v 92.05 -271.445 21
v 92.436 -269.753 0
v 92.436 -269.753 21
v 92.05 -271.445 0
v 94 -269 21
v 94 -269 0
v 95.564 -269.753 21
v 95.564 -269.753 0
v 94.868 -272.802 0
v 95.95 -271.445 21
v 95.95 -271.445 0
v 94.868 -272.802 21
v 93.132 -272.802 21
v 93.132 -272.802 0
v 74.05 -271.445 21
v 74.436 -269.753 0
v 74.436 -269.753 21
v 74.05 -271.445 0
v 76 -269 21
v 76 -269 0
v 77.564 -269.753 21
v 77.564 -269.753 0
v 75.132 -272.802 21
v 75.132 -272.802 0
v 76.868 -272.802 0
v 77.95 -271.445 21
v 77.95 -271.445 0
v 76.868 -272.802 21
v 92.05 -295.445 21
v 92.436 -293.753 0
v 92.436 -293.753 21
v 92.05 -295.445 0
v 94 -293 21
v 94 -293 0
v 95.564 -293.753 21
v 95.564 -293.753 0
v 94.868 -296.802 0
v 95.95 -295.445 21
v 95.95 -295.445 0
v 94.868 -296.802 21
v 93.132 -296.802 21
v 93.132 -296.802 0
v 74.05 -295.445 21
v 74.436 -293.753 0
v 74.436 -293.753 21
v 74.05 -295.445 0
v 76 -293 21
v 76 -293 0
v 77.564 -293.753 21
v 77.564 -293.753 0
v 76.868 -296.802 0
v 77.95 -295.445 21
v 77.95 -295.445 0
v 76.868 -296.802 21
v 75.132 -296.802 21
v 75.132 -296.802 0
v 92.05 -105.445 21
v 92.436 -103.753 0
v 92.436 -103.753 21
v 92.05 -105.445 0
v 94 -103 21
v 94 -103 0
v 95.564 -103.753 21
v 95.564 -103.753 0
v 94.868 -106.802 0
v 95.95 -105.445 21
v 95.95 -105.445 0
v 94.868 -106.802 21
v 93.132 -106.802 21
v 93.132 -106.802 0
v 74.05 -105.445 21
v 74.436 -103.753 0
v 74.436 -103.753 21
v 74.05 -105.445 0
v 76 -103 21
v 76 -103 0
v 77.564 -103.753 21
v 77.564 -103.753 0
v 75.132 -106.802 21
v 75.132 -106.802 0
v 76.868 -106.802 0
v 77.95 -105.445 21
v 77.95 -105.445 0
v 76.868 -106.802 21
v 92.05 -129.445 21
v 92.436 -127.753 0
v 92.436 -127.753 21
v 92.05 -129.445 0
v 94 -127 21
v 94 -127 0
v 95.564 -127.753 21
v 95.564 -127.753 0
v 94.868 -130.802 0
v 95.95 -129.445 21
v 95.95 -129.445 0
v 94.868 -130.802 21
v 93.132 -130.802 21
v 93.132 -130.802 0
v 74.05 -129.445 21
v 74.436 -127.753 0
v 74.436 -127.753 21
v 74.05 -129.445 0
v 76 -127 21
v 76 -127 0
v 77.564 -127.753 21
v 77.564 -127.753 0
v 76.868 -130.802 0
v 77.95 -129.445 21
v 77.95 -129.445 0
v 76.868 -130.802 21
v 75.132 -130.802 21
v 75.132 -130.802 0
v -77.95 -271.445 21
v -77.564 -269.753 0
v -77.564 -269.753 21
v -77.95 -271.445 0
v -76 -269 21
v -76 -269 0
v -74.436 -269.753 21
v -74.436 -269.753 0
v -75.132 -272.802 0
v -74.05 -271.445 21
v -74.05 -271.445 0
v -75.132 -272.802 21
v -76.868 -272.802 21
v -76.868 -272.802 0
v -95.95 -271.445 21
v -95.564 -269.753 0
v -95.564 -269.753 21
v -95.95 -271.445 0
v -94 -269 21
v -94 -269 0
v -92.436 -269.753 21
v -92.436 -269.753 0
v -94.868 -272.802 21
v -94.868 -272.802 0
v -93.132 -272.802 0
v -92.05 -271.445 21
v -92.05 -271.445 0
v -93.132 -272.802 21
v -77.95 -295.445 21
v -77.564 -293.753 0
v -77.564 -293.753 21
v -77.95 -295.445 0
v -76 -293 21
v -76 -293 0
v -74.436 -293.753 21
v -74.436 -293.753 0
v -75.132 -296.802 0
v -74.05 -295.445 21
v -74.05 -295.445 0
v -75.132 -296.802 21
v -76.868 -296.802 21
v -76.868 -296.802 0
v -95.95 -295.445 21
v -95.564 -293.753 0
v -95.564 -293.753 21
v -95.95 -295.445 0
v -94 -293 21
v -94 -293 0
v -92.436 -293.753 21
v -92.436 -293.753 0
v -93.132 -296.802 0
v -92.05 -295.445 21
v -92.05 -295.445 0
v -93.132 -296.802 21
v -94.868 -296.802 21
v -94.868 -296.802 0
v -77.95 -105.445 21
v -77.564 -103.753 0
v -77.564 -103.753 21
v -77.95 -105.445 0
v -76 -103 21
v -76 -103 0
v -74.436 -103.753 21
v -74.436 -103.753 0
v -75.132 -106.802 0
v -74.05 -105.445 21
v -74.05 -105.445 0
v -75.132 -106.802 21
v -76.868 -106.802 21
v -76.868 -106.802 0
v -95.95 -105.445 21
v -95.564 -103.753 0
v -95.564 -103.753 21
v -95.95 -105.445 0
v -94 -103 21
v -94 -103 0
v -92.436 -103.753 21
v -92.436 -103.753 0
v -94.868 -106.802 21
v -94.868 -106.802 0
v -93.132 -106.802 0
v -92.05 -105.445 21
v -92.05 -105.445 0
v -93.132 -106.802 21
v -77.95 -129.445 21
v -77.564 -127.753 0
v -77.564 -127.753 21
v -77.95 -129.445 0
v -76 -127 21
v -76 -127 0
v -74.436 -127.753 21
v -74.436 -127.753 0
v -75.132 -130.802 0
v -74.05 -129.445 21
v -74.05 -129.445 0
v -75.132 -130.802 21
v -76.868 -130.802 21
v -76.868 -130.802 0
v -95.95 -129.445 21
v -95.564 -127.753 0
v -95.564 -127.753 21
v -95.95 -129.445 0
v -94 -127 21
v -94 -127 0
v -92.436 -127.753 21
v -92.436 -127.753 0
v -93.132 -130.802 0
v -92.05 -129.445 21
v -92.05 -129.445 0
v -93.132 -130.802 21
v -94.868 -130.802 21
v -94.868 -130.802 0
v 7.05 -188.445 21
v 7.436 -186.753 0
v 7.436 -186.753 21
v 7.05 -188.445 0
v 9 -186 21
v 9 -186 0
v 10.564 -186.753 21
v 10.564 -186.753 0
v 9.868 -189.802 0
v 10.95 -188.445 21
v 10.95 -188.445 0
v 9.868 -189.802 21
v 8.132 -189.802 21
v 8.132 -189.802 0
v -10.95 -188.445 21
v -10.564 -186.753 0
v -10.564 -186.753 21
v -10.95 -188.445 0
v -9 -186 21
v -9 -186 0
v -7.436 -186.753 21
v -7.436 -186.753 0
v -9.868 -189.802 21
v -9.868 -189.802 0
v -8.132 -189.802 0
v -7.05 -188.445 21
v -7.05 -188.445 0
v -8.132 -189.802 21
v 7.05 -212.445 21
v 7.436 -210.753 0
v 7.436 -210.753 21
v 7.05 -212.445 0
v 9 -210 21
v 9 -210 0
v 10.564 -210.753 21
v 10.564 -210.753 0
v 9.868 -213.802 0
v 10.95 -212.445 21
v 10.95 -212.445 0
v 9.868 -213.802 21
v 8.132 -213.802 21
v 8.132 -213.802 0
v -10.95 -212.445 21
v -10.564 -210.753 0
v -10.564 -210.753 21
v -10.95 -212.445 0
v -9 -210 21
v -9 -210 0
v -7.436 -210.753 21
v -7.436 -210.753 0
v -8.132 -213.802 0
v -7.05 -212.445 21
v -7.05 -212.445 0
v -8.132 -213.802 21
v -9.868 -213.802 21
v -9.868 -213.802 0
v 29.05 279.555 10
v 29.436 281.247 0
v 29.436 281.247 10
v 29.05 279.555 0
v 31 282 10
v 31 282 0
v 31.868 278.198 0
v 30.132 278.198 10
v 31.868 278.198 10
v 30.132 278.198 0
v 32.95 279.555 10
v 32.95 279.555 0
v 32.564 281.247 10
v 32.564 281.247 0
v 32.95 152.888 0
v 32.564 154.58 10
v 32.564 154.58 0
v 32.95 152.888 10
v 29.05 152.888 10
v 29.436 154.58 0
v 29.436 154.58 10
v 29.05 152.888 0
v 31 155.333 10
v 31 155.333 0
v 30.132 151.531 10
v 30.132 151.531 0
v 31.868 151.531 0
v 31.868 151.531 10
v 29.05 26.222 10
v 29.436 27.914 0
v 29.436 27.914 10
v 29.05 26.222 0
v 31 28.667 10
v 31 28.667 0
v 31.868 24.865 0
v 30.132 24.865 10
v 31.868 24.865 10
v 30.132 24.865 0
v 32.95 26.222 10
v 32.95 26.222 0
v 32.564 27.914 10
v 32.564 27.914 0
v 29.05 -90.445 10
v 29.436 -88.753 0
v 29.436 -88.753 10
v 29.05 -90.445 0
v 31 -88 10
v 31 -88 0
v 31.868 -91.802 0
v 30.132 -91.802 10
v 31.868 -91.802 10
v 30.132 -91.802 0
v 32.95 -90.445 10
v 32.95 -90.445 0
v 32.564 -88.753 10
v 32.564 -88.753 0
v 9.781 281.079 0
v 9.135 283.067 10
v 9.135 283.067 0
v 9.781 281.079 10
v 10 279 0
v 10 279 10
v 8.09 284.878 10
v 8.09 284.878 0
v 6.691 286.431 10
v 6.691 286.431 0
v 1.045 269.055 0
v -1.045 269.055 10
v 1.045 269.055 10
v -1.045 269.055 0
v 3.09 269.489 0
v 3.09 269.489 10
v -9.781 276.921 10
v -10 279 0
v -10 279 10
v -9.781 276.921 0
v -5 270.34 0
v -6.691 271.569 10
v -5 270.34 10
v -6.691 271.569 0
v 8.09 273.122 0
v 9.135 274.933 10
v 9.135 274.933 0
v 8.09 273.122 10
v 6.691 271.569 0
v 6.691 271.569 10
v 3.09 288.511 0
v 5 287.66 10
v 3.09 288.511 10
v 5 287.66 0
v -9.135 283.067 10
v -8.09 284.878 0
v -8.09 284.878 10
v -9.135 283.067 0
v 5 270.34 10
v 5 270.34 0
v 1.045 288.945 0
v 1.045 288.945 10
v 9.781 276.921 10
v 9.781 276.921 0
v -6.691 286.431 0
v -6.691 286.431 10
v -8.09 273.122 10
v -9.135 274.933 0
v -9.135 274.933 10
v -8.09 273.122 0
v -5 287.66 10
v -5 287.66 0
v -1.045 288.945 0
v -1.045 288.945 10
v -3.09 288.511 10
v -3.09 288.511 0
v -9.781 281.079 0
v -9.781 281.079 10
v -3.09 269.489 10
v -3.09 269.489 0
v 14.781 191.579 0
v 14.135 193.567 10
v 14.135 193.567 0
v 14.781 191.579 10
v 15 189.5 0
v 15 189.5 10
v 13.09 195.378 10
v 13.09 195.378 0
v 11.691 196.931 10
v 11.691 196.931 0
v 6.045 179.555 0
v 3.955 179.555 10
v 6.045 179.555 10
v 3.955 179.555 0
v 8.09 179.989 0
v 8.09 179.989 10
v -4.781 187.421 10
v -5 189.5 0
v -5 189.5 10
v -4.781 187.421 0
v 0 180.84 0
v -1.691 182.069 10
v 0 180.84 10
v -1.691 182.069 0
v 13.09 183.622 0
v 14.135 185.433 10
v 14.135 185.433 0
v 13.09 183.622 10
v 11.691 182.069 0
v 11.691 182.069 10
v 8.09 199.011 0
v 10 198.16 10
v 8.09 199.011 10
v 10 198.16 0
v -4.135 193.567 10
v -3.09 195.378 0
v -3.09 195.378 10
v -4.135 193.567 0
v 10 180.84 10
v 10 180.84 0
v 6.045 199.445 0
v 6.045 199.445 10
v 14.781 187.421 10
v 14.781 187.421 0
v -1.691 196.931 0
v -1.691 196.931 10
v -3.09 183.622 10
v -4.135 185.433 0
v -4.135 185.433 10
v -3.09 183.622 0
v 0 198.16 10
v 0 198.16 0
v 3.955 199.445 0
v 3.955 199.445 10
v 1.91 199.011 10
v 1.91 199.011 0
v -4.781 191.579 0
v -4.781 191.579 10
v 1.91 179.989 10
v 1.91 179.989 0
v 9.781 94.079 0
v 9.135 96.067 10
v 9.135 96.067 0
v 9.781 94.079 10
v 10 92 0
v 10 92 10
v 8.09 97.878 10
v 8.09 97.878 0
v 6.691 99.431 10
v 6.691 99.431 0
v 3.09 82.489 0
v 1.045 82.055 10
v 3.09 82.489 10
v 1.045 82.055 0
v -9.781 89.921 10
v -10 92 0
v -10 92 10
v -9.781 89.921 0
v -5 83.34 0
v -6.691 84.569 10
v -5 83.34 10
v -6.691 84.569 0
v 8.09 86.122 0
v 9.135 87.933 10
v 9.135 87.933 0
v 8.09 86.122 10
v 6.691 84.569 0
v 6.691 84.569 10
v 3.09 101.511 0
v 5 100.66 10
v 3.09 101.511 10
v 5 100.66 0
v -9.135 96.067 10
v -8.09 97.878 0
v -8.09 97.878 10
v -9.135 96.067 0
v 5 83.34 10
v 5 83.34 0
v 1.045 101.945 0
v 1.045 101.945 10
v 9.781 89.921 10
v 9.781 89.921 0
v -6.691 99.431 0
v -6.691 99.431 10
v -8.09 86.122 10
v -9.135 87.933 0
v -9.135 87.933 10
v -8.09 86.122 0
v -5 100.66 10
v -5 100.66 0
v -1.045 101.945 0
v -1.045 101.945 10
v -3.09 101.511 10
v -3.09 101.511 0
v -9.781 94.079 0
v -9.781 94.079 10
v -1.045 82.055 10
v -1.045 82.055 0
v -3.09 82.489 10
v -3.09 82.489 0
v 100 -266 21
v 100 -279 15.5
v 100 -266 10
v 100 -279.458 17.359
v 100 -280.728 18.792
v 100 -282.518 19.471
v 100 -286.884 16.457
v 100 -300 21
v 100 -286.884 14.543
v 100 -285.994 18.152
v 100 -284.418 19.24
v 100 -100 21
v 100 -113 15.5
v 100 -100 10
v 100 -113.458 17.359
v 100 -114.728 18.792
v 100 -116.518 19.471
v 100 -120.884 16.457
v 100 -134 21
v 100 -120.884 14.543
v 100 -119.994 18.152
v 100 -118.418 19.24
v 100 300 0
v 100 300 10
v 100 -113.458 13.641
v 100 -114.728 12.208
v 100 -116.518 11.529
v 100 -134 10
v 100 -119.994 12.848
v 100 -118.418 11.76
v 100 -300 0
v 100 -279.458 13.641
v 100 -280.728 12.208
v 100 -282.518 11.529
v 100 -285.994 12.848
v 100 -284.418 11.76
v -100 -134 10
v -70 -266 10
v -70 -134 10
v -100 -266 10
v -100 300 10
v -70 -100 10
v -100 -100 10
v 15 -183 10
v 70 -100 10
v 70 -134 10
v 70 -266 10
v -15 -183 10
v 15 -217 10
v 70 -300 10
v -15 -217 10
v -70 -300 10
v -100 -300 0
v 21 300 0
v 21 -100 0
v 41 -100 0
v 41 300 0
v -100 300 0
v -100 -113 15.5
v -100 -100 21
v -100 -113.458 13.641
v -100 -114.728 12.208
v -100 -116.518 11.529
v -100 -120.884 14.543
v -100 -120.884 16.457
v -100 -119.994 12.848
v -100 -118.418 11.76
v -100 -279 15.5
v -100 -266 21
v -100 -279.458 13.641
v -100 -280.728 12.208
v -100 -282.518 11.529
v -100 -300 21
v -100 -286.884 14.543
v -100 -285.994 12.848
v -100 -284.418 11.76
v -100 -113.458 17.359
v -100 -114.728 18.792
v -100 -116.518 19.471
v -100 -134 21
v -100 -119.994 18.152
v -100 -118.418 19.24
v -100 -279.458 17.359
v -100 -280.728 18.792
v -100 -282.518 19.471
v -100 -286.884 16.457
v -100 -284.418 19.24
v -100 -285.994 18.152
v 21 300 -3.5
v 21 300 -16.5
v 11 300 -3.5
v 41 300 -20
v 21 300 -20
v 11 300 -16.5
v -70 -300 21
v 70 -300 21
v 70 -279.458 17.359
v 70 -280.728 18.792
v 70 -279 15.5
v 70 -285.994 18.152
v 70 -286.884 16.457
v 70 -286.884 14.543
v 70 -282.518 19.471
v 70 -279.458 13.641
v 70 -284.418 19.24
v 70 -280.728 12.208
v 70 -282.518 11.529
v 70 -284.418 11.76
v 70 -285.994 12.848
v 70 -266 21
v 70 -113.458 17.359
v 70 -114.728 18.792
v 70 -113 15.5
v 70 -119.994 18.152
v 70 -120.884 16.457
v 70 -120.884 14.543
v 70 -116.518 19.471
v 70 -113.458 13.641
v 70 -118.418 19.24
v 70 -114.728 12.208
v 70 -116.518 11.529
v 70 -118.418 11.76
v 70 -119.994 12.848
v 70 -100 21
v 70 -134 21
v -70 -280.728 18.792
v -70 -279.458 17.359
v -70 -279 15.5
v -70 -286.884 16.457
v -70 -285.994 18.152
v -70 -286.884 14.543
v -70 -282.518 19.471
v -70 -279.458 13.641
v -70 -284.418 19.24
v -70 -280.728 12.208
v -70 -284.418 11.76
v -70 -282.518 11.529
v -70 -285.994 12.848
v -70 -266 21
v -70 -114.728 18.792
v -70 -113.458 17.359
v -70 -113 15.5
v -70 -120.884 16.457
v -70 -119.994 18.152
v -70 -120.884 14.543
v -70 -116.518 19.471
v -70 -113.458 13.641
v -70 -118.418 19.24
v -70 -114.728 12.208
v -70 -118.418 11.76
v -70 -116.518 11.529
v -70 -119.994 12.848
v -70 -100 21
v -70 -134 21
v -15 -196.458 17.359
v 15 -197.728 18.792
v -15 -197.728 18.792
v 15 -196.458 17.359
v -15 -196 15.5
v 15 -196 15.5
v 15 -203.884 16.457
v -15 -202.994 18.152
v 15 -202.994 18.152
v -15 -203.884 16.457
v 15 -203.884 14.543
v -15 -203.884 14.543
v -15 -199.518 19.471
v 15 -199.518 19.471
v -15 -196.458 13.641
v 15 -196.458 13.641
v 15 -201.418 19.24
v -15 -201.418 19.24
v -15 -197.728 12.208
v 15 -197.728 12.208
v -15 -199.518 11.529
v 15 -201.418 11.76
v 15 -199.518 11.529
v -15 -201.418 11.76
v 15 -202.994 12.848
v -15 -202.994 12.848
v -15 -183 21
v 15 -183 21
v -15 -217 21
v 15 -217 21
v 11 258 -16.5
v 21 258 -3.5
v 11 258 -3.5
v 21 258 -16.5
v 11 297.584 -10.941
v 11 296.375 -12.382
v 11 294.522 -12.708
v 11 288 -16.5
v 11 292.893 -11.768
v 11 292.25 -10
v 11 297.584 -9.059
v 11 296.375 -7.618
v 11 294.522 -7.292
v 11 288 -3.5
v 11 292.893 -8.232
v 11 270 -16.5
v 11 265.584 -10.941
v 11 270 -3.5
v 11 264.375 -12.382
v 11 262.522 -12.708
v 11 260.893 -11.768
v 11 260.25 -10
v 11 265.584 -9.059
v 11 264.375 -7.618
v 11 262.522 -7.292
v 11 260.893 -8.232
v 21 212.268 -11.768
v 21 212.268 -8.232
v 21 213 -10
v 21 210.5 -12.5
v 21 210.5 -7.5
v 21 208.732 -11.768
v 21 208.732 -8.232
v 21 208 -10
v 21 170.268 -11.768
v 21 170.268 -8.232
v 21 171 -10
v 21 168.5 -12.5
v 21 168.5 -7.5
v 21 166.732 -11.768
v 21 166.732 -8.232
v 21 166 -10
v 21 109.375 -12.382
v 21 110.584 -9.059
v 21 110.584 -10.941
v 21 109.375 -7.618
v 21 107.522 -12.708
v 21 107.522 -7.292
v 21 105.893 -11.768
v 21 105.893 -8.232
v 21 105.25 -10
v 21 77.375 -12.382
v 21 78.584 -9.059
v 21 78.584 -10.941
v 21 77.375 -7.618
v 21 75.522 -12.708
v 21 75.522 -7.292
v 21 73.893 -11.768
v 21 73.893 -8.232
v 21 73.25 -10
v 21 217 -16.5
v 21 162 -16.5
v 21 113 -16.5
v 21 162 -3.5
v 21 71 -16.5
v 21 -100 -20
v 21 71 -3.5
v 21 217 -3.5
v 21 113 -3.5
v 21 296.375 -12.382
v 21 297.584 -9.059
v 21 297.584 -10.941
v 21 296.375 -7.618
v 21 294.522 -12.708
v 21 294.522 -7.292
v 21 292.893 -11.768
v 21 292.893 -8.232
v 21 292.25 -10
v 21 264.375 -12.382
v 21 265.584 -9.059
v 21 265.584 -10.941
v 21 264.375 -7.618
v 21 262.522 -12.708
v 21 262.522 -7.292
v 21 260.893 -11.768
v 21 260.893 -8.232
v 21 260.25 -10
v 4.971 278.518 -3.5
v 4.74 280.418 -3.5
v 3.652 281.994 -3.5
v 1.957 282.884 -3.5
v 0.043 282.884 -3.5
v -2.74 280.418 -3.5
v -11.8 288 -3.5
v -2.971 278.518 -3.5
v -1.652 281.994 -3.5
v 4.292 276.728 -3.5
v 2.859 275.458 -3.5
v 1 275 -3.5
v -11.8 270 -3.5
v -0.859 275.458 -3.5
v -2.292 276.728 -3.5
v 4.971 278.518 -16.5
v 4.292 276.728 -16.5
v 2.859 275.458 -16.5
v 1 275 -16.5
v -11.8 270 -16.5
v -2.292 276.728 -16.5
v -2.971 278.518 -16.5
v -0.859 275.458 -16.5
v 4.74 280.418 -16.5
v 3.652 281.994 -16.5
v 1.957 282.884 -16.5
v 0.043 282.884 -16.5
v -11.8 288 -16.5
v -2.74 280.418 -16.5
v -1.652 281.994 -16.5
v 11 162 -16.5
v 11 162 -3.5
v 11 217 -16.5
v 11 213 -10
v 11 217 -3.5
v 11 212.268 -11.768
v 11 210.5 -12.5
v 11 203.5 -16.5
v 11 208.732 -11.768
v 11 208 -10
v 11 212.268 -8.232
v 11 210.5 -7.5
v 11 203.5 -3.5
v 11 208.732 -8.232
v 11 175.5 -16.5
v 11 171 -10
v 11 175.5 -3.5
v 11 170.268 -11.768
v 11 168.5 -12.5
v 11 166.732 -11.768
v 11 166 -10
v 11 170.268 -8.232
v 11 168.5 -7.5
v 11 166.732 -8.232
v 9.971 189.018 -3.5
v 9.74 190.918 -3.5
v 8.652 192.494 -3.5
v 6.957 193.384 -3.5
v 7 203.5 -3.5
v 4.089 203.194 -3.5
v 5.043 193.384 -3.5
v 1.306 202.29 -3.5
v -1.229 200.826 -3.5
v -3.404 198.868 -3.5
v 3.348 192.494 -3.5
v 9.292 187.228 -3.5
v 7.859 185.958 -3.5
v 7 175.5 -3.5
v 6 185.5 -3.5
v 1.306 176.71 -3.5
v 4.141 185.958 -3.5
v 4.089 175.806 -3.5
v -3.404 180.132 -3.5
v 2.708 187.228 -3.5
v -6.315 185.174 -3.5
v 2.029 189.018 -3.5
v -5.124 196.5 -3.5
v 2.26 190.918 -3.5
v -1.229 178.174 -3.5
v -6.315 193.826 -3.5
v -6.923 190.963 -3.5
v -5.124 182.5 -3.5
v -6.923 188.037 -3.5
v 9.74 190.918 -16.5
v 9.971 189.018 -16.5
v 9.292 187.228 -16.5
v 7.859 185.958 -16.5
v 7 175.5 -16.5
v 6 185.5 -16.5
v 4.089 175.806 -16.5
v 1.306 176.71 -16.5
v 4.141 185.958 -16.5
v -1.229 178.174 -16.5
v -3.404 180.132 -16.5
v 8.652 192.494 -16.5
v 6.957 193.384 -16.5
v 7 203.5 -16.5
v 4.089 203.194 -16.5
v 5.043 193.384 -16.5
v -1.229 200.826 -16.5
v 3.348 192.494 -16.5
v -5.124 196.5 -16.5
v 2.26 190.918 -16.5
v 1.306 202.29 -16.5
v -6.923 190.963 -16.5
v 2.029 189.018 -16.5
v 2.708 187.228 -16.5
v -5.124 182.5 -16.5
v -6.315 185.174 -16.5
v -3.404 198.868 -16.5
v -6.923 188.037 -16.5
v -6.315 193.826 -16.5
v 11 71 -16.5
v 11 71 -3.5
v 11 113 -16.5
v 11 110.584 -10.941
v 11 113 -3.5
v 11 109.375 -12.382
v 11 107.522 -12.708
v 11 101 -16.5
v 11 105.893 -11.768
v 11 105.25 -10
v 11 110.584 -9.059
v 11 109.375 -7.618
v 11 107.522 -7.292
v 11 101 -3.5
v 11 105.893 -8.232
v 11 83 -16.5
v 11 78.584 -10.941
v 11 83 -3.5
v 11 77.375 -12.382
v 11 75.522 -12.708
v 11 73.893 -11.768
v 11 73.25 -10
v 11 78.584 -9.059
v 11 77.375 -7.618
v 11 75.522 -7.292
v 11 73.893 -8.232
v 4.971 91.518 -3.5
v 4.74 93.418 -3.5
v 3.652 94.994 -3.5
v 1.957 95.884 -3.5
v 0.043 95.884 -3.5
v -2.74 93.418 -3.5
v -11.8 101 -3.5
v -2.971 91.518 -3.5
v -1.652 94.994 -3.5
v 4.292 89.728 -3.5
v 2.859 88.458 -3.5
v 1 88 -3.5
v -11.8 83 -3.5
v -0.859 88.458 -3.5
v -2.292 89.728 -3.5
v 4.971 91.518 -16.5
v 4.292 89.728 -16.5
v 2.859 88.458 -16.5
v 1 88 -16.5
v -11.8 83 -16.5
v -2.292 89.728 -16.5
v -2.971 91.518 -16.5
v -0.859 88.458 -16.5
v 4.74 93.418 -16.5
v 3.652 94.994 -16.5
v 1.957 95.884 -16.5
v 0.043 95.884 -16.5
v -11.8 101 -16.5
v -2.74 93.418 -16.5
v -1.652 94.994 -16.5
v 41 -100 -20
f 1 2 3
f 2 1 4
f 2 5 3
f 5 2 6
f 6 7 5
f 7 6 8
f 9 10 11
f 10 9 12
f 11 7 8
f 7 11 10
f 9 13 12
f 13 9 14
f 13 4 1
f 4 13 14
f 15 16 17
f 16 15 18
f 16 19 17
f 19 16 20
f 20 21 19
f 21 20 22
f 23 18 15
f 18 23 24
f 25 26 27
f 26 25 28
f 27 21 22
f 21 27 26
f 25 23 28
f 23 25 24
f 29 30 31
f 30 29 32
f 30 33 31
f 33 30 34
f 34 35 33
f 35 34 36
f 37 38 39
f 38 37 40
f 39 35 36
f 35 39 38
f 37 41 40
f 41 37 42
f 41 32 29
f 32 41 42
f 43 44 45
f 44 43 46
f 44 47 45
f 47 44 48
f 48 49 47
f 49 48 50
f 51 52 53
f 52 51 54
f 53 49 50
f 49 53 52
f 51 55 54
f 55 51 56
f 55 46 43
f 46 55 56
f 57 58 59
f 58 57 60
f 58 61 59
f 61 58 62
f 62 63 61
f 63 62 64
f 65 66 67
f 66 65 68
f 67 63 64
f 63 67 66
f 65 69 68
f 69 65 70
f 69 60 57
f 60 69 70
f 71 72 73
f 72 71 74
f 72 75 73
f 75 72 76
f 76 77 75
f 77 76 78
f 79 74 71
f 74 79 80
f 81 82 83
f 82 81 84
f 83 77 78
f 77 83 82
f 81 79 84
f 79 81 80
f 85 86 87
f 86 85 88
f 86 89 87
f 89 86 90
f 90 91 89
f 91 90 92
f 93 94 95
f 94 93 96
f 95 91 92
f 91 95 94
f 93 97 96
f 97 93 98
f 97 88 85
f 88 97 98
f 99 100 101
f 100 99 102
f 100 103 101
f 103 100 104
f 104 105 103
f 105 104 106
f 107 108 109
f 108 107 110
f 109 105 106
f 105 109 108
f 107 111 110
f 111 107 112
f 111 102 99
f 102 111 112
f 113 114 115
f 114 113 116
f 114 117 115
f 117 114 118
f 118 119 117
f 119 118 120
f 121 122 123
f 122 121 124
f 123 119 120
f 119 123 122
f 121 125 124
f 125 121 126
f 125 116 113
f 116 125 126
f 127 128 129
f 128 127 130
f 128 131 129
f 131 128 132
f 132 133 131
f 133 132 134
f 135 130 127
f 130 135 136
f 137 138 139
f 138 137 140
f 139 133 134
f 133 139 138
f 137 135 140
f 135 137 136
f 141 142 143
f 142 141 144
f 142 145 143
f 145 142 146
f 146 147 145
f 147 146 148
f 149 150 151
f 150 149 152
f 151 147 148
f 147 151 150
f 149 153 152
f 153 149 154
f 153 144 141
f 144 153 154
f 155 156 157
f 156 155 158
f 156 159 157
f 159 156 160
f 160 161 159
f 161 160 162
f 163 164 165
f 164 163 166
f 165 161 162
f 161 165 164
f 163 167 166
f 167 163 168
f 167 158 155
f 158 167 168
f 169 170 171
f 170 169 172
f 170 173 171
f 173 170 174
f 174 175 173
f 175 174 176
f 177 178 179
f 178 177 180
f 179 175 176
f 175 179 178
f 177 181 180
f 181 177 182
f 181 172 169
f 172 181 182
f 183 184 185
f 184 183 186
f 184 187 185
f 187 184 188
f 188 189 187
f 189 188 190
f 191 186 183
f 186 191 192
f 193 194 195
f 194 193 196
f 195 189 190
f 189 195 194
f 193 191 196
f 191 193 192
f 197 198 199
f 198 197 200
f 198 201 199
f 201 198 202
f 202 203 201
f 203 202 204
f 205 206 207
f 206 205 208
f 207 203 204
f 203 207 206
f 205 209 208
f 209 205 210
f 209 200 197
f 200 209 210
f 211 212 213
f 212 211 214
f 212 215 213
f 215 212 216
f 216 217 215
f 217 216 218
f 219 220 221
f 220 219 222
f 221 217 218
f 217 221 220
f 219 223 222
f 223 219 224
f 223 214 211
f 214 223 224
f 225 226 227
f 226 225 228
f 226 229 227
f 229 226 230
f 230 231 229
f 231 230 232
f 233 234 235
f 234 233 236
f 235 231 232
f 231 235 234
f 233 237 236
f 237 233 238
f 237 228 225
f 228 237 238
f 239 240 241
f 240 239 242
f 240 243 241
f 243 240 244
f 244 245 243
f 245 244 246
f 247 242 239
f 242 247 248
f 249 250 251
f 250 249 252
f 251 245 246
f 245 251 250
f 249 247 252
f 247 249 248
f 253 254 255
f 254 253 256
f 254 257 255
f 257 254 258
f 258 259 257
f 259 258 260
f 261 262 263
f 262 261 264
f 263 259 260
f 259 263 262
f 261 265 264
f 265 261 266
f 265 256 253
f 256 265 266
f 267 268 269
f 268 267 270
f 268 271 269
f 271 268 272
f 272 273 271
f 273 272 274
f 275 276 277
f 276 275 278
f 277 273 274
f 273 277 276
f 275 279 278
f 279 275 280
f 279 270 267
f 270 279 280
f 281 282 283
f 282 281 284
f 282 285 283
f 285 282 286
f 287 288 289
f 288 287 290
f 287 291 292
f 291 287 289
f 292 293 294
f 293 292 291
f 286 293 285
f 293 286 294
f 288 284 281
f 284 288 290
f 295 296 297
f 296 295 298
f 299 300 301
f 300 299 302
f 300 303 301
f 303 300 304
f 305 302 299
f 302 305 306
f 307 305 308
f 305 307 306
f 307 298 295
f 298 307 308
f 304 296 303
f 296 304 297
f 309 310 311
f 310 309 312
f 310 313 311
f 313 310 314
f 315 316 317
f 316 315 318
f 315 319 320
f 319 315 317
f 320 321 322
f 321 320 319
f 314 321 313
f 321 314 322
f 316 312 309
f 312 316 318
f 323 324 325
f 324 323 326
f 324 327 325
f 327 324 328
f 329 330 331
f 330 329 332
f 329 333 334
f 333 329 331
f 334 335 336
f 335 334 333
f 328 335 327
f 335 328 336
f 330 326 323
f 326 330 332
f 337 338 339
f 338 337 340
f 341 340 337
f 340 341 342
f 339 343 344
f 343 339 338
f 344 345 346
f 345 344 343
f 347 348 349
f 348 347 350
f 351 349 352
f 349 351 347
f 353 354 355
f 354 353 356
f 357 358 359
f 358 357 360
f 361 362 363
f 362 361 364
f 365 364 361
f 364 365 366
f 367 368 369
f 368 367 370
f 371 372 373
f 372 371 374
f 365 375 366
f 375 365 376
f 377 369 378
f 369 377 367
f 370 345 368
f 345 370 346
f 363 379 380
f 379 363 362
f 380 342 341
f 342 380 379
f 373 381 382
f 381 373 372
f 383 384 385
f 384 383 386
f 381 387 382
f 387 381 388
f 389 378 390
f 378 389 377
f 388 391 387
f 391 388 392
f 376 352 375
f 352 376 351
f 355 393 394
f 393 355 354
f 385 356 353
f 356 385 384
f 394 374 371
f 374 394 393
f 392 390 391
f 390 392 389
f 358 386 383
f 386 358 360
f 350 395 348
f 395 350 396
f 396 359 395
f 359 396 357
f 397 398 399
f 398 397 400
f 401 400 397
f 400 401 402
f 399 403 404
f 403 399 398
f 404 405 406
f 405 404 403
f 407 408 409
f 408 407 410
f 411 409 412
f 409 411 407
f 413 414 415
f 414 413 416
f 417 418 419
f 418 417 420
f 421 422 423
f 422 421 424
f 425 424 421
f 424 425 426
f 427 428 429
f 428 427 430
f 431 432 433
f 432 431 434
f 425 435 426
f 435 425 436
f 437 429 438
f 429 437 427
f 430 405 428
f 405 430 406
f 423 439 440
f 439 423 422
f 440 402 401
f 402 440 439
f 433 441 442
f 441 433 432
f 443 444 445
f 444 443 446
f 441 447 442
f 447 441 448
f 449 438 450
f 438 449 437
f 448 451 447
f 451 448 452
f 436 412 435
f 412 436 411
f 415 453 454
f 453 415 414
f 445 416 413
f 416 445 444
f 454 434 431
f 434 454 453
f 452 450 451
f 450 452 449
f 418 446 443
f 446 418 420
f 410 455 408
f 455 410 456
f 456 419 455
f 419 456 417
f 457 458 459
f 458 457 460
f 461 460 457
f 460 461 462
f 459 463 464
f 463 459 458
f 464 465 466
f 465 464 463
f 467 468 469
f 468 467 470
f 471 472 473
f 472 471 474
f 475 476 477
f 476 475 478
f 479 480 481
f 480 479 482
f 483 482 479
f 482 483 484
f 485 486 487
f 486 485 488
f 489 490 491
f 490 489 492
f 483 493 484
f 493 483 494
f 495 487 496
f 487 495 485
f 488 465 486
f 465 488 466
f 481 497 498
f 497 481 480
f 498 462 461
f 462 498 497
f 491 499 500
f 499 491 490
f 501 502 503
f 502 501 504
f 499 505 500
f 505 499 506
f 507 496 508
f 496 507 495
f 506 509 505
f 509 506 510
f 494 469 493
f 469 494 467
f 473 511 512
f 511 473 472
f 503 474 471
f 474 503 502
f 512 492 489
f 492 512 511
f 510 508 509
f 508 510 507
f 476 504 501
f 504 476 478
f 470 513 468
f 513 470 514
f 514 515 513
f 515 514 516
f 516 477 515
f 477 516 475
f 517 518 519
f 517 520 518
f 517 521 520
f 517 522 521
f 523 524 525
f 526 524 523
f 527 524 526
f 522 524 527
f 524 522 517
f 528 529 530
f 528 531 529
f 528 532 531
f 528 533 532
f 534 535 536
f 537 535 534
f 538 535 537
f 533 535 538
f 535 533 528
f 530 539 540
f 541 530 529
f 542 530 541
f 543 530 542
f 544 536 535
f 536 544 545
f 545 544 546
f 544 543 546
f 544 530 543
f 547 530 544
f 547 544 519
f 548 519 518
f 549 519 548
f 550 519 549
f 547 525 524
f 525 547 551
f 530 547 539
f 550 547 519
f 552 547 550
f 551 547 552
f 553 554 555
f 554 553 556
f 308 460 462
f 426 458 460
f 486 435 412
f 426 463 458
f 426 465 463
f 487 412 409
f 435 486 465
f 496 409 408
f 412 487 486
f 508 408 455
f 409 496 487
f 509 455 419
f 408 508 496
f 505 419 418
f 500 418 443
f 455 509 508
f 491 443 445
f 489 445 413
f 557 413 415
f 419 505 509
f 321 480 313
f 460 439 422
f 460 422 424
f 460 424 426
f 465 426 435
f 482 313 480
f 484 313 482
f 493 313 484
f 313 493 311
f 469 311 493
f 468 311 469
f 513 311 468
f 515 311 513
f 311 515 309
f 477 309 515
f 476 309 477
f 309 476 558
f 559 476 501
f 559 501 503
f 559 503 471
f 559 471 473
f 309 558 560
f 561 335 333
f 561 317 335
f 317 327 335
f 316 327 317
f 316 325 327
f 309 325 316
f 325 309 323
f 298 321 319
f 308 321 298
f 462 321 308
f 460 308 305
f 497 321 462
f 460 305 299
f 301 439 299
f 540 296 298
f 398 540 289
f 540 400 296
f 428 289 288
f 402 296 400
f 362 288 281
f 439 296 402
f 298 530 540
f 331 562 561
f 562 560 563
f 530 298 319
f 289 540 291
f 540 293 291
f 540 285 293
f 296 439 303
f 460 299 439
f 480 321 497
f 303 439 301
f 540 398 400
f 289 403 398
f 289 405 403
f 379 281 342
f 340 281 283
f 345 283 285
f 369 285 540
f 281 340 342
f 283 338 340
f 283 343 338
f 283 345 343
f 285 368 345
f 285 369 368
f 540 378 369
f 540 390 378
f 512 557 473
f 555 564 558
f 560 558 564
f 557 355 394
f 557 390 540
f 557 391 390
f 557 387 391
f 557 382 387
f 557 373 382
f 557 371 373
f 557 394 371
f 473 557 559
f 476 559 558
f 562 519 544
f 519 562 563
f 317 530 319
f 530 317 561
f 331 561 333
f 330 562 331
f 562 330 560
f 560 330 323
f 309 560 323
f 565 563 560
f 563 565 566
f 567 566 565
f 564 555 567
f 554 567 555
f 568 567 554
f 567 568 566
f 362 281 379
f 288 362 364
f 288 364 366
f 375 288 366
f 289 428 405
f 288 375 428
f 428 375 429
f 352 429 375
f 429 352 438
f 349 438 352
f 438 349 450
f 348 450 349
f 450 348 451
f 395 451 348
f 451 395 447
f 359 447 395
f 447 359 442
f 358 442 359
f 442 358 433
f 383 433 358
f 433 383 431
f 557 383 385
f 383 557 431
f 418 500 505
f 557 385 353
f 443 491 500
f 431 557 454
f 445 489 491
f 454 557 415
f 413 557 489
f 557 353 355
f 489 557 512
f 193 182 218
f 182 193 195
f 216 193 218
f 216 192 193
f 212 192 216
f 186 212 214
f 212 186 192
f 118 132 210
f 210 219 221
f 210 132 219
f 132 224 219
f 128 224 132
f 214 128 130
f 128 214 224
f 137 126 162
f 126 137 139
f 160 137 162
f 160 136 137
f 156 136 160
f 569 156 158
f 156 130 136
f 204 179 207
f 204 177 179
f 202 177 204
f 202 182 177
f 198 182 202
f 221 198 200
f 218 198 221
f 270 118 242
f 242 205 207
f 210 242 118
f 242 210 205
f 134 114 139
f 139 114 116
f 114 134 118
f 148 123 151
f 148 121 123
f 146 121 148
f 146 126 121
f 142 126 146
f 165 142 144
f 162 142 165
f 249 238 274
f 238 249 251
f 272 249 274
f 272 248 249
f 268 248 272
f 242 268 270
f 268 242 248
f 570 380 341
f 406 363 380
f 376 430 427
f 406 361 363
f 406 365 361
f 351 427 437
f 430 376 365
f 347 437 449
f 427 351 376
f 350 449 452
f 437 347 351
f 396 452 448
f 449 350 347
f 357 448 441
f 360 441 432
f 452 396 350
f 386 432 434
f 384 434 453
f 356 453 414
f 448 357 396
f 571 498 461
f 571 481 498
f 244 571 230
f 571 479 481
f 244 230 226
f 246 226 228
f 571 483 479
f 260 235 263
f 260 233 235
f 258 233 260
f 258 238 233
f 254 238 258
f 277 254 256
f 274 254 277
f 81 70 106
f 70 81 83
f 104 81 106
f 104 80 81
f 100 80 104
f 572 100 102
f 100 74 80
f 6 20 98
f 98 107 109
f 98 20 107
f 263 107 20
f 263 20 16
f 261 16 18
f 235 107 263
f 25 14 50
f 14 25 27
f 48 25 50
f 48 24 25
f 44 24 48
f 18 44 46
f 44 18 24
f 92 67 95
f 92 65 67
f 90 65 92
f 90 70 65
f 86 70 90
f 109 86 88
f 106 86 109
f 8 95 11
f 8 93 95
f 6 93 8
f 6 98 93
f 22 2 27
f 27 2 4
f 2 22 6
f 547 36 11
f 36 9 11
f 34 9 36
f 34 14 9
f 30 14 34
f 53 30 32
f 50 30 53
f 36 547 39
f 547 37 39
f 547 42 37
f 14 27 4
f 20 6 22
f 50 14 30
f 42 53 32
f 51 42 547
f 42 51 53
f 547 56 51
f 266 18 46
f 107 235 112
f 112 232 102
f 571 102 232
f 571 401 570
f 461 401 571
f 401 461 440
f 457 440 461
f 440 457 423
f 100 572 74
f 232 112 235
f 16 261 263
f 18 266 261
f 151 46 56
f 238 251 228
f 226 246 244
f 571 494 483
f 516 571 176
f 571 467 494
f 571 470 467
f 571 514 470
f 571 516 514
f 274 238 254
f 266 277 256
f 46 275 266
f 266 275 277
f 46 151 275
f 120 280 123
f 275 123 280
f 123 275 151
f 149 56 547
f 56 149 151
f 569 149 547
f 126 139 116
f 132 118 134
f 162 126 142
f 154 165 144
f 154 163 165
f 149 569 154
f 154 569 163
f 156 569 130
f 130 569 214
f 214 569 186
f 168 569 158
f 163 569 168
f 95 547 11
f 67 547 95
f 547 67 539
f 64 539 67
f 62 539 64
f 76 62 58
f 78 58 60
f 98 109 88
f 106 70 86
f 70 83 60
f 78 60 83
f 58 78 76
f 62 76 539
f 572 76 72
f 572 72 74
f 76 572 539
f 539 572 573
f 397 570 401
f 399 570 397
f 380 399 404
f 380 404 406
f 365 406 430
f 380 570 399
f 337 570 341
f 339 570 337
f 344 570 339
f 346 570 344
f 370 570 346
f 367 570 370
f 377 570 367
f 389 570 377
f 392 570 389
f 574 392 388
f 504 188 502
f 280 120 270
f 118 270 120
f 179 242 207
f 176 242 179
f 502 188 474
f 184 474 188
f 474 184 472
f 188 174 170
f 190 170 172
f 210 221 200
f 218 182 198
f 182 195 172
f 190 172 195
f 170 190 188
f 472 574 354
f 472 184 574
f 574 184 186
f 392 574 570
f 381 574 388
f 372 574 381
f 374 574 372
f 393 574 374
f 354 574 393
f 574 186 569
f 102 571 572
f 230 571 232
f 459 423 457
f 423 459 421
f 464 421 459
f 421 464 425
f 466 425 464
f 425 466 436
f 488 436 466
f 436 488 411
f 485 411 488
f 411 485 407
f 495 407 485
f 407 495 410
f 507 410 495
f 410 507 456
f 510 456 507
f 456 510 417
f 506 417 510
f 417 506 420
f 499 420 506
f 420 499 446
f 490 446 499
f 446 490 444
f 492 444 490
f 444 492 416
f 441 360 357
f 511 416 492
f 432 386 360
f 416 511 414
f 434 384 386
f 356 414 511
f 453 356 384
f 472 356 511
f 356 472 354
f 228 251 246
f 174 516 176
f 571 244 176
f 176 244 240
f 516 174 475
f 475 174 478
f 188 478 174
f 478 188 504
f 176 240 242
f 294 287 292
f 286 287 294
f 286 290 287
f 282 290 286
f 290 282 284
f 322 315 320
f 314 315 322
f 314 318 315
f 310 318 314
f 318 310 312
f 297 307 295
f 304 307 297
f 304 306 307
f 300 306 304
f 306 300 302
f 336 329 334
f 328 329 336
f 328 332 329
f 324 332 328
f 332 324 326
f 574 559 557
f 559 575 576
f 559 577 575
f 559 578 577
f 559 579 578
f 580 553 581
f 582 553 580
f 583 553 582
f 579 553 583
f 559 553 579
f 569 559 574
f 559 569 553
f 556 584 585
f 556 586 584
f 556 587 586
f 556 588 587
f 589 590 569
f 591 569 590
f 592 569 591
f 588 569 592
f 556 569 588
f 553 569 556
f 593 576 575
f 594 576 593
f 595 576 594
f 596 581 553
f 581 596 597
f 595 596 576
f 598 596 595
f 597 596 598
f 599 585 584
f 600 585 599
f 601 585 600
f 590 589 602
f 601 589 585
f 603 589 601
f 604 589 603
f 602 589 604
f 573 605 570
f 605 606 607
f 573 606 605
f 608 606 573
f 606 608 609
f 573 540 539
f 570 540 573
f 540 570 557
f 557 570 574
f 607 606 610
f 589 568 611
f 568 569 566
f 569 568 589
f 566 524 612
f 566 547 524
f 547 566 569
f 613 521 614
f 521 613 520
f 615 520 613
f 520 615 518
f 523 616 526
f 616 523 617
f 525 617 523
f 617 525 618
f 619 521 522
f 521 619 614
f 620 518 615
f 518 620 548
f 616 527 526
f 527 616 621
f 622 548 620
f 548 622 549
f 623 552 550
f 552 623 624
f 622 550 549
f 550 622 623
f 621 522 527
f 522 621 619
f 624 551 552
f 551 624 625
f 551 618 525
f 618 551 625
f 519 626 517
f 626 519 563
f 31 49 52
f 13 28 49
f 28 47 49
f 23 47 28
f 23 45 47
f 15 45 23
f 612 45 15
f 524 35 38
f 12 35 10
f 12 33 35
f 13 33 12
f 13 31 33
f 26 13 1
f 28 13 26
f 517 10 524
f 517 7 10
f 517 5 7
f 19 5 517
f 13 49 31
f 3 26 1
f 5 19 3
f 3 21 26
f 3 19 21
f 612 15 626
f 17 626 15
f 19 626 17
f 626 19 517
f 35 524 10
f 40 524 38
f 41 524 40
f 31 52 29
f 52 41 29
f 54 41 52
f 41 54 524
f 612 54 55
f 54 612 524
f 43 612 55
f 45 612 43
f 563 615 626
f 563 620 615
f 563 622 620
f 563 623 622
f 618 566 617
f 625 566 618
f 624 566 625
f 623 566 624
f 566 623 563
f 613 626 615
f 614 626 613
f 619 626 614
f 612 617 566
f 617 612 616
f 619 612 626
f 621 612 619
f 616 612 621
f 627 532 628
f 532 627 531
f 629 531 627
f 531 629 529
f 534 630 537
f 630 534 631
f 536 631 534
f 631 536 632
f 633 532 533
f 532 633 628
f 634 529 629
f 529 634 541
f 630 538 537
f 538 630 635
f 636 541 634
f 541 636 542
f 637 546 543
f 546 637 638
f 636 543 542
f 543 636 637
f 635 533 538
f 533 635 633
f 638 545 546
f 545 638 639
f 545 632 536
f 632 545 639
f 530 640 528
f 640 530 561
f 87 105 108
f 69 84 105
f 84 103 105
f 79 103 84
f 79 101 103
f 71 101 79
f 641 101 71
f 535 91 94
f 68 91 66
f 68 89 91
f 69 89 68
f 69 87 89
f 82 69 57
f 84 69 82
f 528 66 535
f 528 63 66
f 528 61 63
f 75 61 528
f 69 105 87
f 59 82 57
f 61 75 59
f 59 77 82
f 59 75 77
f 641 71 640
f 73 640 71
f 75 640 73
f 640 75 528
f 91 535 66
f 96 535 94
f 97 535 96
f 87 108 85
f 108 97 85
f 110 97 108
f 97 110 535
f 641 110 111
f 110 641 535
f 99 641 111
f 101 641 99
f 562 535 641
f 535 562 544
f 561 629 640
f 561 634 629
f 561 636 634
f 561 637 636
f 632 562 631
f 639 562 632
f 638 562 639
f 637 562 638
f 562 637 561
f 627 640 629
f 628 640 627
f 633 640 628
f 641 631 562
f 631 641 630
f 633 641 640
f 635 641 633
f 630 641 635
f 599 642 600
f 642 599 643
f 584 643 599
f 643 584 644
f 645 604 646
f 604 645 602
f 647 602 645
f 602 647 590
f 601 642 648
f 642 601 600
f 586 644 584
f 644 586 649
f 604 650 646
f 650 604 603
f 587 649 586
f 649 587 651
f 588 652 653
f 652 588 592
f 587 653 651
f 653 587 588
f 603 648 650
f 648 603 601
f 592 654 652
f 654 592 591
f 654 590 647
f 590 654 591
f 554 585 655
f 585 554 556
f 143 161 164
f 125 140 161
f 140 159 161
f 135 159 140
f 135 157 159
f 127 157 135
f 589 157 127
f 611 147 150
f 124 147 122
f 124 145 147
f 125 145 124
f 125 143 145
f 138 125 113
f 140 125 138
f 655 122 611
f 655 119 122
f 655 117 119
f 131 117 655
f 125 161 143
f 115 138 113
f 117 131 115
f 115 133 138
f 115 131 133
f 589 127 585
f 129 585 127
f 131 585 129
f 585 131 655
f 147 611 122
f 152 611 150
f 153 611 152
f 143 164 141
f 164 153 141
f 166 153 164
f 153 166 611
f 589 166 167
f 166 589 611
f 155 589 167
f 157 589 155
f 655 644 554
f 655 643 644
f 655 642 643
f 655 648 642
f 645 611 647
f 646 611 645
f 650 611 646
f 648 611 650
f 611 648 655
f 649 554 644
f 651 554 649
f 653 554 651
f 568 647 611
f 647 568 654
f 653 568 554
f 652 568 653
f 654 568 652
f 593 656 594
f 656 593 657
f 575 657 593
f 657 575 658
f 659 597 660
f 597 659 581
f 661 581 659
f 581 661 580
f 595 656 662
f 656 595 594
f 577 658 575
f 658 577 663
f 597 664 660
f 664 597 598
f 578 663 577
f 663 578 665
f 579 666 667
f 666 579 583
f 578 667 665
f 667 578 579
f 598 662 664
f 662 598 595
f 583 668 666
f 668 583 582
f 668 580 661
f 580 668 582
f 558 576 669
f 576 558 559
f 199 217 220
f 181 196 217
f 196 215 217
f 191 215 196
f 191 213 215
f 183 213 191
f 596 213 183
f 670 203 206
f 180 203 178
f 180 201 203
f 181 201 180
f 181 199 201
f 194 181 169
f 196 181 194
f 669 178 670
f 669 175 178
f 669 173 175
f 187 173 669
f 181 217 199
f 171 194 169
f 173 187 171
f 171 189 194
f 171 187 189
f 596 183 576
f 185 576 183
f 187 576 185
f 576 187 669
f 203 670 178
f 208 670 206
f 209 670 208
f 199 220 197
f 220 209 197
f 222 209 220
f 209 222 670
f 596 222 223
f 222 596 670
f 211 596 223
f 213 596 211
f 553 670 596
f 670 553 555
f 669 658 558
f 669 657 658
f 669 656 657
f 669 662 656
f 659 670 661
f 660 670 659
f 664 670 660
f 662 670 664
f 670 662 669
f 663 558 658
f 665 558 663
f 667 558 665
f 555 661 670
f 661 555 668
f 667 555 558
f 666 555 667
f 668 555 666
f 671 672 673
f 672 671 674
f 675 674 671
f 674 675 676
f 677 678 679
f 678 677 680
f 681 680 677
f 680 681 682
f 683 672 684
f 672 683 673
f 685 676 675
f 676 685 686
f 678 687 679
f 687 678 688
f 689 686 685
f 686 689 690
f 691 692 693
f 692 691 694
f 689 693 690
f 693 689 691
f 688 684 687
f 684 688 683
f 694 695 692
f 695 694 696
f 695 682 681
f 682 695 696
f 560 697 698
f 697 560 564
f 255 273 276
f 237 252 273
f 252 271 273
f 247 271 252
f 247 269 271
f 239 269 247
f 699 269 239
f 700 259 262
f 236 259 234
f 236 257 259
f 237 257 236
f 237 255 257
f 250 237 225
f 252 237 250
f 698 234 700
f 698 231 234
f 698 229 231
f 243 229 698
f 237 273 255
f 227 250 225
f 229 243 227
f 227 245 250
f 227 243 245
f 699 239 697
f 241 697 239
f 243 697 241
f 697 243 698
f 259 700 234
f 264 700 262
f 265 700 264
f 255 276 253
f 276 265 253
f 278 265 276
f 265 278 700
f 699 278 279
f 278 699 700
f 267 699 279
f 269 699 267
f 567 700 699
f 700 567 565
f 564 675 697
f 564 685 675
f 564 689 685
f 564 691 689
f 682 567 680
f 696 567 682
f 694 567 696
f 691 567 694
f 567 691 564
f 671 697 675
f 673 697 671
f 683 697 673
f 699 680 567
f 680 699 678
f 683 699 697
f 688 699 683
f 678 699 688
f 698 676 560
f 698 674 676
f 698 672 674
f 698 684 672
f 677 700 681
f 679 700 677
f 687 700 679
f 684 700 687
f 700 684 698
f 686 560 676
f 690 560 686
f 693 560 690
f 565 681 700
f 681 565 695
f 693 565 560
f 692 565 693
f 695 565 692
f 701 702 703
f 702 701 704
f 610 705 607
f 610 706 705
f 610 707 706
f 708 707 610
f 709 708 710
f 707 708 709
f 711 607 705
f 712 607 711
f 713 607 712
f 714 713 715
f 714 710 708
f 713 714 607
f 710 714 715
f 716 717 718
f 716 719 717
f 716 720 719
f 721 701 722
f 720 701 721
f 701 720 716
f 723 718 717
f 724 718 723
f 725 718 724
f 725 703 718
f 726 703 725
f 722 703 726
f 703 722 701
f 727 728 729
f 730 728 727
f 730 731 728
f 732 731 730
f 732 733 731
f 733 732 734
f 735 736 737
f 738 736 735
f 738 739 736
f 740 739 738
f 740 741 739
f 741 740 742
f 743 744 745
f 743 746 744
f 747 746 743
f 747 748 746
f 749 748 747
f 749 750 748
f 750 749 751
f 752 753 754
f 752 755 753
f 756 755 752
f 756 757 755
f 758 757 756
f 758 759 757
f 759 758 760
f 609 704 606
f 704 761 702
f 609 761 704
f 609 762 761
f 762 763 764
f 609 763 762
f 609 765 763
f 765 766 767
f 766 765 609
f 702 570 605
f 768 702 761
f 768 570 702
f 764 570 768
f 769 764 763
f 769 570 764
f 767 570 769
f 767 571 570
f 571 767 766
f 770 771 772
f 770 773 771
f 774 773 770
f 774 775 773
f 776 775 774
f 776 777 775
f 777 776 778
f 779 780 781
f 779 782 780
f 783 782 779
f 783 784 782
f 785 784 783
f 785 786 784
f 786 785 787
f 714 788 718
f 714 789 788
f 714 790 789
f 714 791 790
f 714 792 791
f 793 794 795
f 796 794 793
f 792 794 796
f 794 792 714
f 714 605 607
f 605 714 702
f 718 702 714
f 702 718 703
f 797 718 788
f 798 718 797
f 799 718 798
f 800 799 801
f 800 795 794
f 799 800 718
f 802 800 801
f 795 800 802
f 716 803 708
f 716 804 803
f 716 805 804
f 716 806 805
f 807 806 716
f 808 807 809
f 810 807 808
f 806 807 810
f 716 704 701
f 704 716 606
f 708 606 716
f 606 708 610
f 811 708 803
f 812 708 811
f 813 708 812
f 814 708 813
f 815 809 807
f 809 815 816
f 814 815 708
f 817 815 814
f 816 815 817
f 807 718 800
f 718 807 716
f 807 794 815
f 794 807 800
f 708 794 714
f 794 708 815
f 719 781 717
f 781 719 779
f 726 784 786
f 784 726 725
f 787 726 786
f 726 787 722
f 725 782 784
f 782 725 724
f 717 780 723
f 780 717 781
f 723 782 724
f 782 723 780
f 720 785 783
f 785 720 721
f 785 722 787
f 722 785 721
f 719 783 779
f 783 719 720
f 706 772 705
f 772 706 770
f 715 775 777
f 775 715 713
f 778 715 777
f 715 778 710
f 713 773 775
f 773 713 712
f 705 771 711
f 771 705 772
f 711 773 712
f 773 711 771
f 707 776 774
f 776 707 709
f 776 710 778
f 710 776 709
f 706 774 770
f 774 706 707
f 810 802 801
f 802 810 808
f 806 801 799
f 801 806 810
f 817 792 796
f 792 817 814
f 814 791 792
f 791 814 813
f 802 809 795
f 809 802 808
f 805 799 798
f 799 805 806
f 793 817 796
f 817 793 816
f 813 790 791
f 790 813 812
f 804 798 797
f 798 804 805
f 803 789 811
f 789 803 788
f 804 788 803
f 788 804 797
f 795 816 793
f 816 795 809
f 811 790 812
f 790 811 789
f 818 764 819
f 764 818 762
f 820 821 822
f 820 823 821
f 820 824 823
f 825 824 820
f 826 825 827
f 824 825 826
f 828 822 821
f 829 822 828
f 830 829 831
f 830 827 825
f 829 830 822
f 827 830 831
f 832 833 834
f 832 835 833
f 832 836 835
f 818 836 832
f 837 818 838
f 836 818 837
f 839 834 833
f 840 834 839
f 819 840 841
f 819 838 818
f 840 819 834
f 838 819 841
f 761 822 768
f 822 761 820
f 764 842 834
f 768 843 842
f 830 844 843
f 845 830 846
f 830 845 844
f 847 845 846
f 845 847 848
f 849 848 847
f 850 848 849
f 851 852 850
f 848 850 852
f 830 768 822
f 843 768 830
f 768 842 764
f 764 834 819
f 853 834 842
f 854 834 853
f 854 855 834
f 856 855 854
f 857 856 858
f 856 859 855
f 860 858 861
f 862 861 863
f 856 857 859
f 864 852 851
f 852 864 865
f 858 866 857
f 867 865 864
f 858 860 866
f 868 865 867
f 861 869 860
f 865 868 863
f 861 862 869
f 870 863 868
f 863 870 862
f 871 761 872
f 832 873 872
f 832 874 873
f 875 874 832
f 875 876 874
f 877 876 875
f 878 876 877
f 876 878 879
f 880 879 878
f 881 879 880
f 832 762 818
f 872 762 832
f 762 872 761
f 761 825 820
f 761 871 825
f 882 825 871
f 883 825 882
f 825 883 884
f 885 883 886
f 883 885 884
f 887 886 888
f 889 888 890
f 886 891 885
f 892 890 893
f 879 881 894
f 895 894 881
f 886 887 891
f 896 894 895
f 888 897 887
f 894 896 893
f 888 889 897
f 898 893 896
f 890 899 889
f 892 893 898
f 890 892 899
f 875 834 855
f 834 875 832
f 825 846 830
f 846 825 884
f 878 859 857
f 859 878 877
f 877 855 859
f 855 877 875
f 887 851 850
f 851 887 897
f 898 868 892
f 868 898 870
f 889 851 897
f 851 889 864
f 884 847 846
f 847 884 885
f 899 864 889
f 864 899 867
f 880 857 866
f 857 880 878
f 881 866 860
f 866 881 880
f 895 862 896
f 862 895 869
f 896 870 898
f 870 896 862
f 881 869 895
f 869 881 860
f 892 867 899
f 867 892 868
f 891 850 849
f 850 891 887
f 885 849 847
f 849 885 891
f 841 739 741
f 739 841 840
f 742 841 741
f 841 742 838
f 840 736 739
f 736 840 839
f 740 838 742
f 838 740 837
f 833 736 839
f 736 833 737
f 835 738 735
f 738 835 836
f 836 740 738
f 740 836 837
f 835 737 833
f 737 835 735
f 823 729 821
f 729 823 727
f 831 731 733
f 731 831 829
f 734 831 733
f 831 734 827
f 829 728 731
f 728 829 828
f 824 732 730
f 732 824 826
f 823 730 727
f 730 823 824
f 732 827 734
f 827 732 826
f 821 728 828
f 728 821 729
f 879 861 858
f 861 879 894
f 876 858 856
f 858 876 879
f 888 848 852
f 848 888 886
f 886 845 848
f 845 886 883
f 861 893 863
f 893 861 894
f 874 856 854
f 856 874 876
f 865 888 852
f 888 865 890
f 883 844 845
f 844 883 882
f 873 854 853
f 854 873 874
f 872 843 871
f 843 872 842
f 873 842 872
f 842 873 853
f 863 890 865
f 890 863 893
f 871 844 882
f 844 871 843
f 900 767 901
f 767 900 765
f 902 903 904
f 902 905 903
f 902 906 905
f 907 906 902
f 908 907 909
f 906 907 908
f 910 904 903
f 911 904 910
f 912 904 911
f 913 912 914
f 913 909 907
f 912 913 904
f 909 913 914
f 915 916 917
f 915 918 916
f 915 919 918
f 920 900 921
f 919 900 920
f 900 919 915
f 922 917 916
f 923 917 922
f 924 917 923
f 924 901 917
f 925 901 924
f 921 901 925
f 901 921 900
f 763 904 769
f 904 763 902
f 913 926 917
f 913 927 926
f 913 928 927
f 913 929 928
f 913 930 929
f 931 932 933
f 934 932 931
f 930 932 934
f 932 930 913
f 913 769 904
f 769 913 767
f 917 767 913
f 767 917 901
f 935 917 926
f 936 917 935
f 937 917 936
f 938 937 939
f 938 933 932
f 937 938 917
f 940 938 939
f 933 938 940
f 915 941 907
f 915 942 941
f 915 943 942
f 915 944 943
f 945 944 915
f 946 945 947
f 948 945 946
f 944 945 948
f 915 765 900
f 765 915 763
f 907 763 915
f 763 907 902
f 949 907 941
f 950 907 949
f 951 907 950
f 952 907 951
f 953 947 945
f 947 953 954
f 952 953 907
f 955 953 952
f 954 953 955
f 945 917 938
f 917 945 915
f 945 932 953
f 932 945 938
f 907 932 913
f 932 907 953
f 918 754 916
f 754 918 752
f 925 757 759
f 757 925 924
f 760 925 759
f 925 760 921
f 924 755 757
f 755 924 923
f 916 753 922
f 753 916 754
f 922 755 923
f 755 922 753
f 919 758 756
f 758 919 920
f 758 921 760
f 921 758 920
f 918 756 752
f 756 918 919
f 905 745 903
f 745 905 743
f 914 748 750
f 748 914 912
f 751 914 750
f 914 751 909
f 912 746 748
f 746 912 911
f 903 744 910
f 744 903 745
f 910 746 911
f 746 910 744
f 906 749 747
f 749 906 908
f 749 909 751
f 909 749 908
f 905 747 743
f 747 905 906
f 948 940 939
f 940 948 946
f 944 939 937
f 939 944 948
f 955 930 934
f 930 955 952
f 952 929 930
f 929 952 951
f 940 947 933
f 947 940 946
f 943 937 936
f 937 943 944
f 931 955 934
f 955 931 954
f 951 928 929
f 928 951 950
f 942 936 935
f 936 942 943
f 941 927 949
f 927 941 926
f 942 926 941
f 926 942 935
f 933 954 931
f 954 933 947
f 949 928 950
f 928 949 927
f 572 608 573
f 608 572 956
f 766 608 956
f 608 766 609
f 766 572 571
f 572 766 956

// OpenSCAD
// file: components/spindle_mount.scad
spindle_d = 52;
spindle_l = 186;
collet_l = 48;
collet_d = 16;

spindle_mount_w = 91;
spindle_mount_h = 41;
spindle_mount_d = 67;


module spindle(){
    translate([0, collet_l-10]) rotate([90]) cylinder(h=spindle_l-collet_l, d=spindle_d, center=true);
    translate([0, -collet_l/2-10]) rotate([90]) cylinder(h=collet_l, d=collet_d, center=true);            
}

module spindle_mount(show_bolts=false){
    bolt_d = 6;
    bolt_x = 77;
    bolt_y = 26;
    offsets = [
        [ bolt_x/2, bolt_y/2],
        [ bolt_x/2,-bolt_y/2],
        [-bolt_x/2, bolt_y/2],
        [-bolt_x/2,-bolt_y/2],
    ];

    if(show_bolts == true){
        translate([0,0,spindle_mount_d/2]) union(){
            spindle();
            for(t=offsets){
                translate(t) cylinder(h=spindle_mount_d*2, d=bolt_d, center=true);
            }
        }
    }

    // for human eyes only
    if(show_bolts==false){
        difference(){
            translate([0,0,spindle_mount_d/2]) cube([spindle_mount_w, spindle_mount_h, spindle_mount_d], true);
            spindle_mount(true);
        }
    }
}

//spindle_mount();
//%spindle_mount(true);
// file: components/sk8.scad
sk8_w = 42;
sk8_h = 13;
sk8_d = 32.8;
sk8_center_distance = 32;
sk8_axle_diameter = 5.5;

module sk8_bearing(show_axles=false){
    if(show_axles == false){
        difference(){
            union() {
                translate([0,0, 5]) cube([sk8_w,sk8_h,10], true);
                translate([0,0, sk8_d/2]) cube([18,sk8_h,sk8_d], center=true);
            }
            sk8_bearing(show_axles=true);
        }
    }
    if(show_axles == true){
        translate([0,0,20])  rotate([90]) cylinder(h=100, d=8, center=true);
        translate([0,0, sk8_d/2]) union(){
 
            translate([sk8_center_distance/2, 0]) cylinder(h=100, d=sk8_axle_diameter, center=true);
            translate([-sk8_center_distance/2, 0]) cylinder(h=100, d=sk8_axle_diameter, center=true);
        }
    }
}
// file: components/kp08.scad
kp08_w = 55;
kp08_h = 13;
kp08_d = 28;
kp08_center_distance = 42;
kp08_axle_diameter = 5;

module kp08_bearing(show_axles=false){
    if(show_axles == false){
        difference(){
            union() {
                translate([0,0, 5]) cube([kp08_w,kp08_h,10], true);
                translate([0,0, kp08_d/4]) cube([kp08_d,kp08_h,kp08_d/2], true);
                translate([0,0, kp08_d/2]) rotate([90]) cylinder(h=kp08_h, d=kp08_d, center=true);
            }
            kp08_bearing(show_axles=true);
        }
    }
    if(show_axles == true){
        translate([0,0,15])  rotate([90]) cylinder(h=100, d=8, center=true);
        translate([0,0, kp08_d/2]) union(){
 
            translate([kp08_center_distance/2, 0]) cylinder(h=100, d=kp08_axle_diameter, center=true);
            translate([-kp08_center_distance/2, 0]) cylinder(h=100, d=kp08_axle_diameter, center=true);
        }
    }
}


//kp08_bearing();
//kp08_bearing(show_axles=true);
// file: components/sc8uu.scad
// all units in mm
sc8uu_w = 30;
sc8uu_j = 18;
sc8uu_l = 34; 
sc8uu_k = 24;
sc8uu_h = 11;

module m4_bolt(){
    cylinder(h=50, d=4, center=true);
}

module sc8uu(show_bolts=false){
    dx = sc8uu_k/2;
    dy = sc8uu_j/2;
    offsets = [
        [ dx,-dy],
        [ dx, dy],
        [-dx,-dy],
        [-dx, dy]
    ];
    if(show_bolts == true) {
        rotate([90]) cylinder(h=50, d=8, center=true);
        for(t=offsets){
            translate(t) m4_bolt();
        } 
    }
    if(show_bolts == false) {
        difference(){
            cube([sc8uu_l, sc8uu_w, sc8uu_h], true);
            sc8uu(true);
        }
    }
}
// file: spindle_plate.scad
include <components/spindle_mount.scad>;
include <components/sc8uu.scad>;

spindle_plate_w = 150;
spindle_plate_h = 200;
spindle_plate_thickness = 10;

module spindle_plate(show_bolts=false, show_mounts=false){
    dx = spindle_plate_w/2 - sc8uu_l/2;
    dy = spindle_plate_h/2  - sc8uu_w/2;
    dz = -sc8uu_h/2;
    sc8uu_offsets = [
        [ dx,-dy, dz],
        [ dx, dy, dz],
        [-dx,-dy, dz],
        [-dx, dy, dz],
        [  0,  0, dz],
    ];

    if(show_bolts==true){
        translate([0, -spindle_plate_h/4, spindle_plate_thickness]) spindle_mount(true);
        for(t=sc8uu_offsets){
            translate(t) sc8uu(true);
        }
    }
    
    if(show_bolts==false){
        difference(){
            translate([0, 0, spindle_plate_thickness/2]) cube([spindle_plate_w, spindle_plate_h, spindle_plate_thickness], true);
            spindle_plate(true);
        }
    }

    if(show_mounts==true){
        %union(){
            translate([0, -spindle_plate_h/4, spindle_plate_thickness]) union(){
                translate([0,0,spindle_mount_d/2]) spindle();
                spindle_mount();
            }
            for(t=sc8uu_offsets){
                translate(t) sc8uu();
            }
        }
    }

}

//spindle_plate();
//spindle_plate(false, true);
// main file
include <spindle_plate.scad>;
include <components/sc8uu.scad>;
include <components/kp08.scad>;
include <components/sk8.scad>;

horizontal_plate_w = spindle_plate_h;
horizontal_plate_h = 600;
horizontal_plate_thickness = 10;
horizontal_beam_length = horizontal_plate_h - (horizontal_plate_w/2 - sc8uu_w/2)*2 - sc8uu_w;
horizontal_beam_offset = horizontal_plate_w/2 - sc8uu_w/2+sc8uu_w/2;

    
module horizontal_beam_bolt(){
    cylinder(d=4, h=50, center=true);
}
    
module horizontal_plate(show_bolts=false, show_mounts=false){

    dx = horizontal_plate_w/2 - sc8uu_w/2;
    dy = spindle_plate_h/2  - sc8uu_l/2;
    dz = sc8uu_h/2 + horizontal_plate_thickness;
    bearings_offset = [0, - horizontal_plate_h/2 + dy + sc8uu_l/2];
    
    horizontal_sc8uu_offsets = [
        [ dx,-dy, dz],
        [ dx, dy, dz],
        [-dx,-dy, dz],
        [-dx, dy, dz],
        [  0,  0, dz],
    ];
    
    beam_bolt_offsets = [
        [10, (horizontal_beam_length-20) -horizontal_beam_offset],
        [10, (horizontal_beam_length-20)*2/3 -horizontal_beam_offset],
        [10, (horizontal_beam_length-20)*1/3 -horizontal_beam_offset],
        [10, 10-horizontal_beam_offset],    
    ];
    
    vertical_plate_dx = spindle_plate_h/2  - sc8uu_l/2;
    beam_rod_offset_1 = [0,horizontal_plate_h/2 - sk8_w/2,-10];
    beam_rod_offset_2 = [0,horizontal_plate_h/2 - kp08_w/2-vertical_plate_dx,-10];
    beam_rod_offset_3 = [0,horizontal_plate_h/2 - sk8_w -vertical_plate_dx*2,-10];

    if(show_bolts==true){
        translate(bearings_offset) union(){
            for(t=horizontal_sc8uu_offsets){
                translate(t) rotate([0, 0, 90]) sc8uu(true);
            }
        }
        
        translate([kp08_center_distance/2,0,0]) union(){
            for(t=beam_bolt_offsets){
                translate(t) rotate([0, 0, 90])  horizontal_beam_bolt();
            }
            translate(beam_rod_offset_1) translate([-kp08_center_distance/2,0,0]) cylinder(h=50, d=20, center=true);
            translate(beam_rod_offset_2) translate([-sk8_center_distance/2,0,0]) cylinder(h=50, d=20, center=true);
            translate(beam_rod_offset_3) translate([-kp08_center_distance/2,0,0]) cylinder(h=50, d=20, center=true);
        }
    }
    
    if(show_bolts==false){
        difference(){
            translate([0, 0, horizontal_plate_thickness/2]) cube([horizontal_plate_w, horizontal_plate_h, horizontal_plate_thickness], true);
            horizontal_plate(true);
        }
    }

    if(show_mounts==true){
        union(){
            translate(bearings_offset) union(){
                for(t=horizontal_sc8uu_offsets){
                     translate(t) rotate([0, 0, 90]) sc8uu();
                }
            }

        translate([kp08_center_distance/2,0,0]) union(){

                translate([10, horizontal_beam_offset, -horizontal_plate_thickness]) cube([20,horizontal_beam_length,20], center=true);
                translate(beam_rod_offset_1) rotate([90, 0, -90]) sk8_bearing();
                translate(beam_rod_offset_2) rotate([90, 0, -90]) kp08_bearing();
                translate(beam_rod_offset_3) rotate([90, 0, -90]) sk8_bearing();
        }
        }

    }

}

horizontal_plate();
horizontal_plate(false, true);
